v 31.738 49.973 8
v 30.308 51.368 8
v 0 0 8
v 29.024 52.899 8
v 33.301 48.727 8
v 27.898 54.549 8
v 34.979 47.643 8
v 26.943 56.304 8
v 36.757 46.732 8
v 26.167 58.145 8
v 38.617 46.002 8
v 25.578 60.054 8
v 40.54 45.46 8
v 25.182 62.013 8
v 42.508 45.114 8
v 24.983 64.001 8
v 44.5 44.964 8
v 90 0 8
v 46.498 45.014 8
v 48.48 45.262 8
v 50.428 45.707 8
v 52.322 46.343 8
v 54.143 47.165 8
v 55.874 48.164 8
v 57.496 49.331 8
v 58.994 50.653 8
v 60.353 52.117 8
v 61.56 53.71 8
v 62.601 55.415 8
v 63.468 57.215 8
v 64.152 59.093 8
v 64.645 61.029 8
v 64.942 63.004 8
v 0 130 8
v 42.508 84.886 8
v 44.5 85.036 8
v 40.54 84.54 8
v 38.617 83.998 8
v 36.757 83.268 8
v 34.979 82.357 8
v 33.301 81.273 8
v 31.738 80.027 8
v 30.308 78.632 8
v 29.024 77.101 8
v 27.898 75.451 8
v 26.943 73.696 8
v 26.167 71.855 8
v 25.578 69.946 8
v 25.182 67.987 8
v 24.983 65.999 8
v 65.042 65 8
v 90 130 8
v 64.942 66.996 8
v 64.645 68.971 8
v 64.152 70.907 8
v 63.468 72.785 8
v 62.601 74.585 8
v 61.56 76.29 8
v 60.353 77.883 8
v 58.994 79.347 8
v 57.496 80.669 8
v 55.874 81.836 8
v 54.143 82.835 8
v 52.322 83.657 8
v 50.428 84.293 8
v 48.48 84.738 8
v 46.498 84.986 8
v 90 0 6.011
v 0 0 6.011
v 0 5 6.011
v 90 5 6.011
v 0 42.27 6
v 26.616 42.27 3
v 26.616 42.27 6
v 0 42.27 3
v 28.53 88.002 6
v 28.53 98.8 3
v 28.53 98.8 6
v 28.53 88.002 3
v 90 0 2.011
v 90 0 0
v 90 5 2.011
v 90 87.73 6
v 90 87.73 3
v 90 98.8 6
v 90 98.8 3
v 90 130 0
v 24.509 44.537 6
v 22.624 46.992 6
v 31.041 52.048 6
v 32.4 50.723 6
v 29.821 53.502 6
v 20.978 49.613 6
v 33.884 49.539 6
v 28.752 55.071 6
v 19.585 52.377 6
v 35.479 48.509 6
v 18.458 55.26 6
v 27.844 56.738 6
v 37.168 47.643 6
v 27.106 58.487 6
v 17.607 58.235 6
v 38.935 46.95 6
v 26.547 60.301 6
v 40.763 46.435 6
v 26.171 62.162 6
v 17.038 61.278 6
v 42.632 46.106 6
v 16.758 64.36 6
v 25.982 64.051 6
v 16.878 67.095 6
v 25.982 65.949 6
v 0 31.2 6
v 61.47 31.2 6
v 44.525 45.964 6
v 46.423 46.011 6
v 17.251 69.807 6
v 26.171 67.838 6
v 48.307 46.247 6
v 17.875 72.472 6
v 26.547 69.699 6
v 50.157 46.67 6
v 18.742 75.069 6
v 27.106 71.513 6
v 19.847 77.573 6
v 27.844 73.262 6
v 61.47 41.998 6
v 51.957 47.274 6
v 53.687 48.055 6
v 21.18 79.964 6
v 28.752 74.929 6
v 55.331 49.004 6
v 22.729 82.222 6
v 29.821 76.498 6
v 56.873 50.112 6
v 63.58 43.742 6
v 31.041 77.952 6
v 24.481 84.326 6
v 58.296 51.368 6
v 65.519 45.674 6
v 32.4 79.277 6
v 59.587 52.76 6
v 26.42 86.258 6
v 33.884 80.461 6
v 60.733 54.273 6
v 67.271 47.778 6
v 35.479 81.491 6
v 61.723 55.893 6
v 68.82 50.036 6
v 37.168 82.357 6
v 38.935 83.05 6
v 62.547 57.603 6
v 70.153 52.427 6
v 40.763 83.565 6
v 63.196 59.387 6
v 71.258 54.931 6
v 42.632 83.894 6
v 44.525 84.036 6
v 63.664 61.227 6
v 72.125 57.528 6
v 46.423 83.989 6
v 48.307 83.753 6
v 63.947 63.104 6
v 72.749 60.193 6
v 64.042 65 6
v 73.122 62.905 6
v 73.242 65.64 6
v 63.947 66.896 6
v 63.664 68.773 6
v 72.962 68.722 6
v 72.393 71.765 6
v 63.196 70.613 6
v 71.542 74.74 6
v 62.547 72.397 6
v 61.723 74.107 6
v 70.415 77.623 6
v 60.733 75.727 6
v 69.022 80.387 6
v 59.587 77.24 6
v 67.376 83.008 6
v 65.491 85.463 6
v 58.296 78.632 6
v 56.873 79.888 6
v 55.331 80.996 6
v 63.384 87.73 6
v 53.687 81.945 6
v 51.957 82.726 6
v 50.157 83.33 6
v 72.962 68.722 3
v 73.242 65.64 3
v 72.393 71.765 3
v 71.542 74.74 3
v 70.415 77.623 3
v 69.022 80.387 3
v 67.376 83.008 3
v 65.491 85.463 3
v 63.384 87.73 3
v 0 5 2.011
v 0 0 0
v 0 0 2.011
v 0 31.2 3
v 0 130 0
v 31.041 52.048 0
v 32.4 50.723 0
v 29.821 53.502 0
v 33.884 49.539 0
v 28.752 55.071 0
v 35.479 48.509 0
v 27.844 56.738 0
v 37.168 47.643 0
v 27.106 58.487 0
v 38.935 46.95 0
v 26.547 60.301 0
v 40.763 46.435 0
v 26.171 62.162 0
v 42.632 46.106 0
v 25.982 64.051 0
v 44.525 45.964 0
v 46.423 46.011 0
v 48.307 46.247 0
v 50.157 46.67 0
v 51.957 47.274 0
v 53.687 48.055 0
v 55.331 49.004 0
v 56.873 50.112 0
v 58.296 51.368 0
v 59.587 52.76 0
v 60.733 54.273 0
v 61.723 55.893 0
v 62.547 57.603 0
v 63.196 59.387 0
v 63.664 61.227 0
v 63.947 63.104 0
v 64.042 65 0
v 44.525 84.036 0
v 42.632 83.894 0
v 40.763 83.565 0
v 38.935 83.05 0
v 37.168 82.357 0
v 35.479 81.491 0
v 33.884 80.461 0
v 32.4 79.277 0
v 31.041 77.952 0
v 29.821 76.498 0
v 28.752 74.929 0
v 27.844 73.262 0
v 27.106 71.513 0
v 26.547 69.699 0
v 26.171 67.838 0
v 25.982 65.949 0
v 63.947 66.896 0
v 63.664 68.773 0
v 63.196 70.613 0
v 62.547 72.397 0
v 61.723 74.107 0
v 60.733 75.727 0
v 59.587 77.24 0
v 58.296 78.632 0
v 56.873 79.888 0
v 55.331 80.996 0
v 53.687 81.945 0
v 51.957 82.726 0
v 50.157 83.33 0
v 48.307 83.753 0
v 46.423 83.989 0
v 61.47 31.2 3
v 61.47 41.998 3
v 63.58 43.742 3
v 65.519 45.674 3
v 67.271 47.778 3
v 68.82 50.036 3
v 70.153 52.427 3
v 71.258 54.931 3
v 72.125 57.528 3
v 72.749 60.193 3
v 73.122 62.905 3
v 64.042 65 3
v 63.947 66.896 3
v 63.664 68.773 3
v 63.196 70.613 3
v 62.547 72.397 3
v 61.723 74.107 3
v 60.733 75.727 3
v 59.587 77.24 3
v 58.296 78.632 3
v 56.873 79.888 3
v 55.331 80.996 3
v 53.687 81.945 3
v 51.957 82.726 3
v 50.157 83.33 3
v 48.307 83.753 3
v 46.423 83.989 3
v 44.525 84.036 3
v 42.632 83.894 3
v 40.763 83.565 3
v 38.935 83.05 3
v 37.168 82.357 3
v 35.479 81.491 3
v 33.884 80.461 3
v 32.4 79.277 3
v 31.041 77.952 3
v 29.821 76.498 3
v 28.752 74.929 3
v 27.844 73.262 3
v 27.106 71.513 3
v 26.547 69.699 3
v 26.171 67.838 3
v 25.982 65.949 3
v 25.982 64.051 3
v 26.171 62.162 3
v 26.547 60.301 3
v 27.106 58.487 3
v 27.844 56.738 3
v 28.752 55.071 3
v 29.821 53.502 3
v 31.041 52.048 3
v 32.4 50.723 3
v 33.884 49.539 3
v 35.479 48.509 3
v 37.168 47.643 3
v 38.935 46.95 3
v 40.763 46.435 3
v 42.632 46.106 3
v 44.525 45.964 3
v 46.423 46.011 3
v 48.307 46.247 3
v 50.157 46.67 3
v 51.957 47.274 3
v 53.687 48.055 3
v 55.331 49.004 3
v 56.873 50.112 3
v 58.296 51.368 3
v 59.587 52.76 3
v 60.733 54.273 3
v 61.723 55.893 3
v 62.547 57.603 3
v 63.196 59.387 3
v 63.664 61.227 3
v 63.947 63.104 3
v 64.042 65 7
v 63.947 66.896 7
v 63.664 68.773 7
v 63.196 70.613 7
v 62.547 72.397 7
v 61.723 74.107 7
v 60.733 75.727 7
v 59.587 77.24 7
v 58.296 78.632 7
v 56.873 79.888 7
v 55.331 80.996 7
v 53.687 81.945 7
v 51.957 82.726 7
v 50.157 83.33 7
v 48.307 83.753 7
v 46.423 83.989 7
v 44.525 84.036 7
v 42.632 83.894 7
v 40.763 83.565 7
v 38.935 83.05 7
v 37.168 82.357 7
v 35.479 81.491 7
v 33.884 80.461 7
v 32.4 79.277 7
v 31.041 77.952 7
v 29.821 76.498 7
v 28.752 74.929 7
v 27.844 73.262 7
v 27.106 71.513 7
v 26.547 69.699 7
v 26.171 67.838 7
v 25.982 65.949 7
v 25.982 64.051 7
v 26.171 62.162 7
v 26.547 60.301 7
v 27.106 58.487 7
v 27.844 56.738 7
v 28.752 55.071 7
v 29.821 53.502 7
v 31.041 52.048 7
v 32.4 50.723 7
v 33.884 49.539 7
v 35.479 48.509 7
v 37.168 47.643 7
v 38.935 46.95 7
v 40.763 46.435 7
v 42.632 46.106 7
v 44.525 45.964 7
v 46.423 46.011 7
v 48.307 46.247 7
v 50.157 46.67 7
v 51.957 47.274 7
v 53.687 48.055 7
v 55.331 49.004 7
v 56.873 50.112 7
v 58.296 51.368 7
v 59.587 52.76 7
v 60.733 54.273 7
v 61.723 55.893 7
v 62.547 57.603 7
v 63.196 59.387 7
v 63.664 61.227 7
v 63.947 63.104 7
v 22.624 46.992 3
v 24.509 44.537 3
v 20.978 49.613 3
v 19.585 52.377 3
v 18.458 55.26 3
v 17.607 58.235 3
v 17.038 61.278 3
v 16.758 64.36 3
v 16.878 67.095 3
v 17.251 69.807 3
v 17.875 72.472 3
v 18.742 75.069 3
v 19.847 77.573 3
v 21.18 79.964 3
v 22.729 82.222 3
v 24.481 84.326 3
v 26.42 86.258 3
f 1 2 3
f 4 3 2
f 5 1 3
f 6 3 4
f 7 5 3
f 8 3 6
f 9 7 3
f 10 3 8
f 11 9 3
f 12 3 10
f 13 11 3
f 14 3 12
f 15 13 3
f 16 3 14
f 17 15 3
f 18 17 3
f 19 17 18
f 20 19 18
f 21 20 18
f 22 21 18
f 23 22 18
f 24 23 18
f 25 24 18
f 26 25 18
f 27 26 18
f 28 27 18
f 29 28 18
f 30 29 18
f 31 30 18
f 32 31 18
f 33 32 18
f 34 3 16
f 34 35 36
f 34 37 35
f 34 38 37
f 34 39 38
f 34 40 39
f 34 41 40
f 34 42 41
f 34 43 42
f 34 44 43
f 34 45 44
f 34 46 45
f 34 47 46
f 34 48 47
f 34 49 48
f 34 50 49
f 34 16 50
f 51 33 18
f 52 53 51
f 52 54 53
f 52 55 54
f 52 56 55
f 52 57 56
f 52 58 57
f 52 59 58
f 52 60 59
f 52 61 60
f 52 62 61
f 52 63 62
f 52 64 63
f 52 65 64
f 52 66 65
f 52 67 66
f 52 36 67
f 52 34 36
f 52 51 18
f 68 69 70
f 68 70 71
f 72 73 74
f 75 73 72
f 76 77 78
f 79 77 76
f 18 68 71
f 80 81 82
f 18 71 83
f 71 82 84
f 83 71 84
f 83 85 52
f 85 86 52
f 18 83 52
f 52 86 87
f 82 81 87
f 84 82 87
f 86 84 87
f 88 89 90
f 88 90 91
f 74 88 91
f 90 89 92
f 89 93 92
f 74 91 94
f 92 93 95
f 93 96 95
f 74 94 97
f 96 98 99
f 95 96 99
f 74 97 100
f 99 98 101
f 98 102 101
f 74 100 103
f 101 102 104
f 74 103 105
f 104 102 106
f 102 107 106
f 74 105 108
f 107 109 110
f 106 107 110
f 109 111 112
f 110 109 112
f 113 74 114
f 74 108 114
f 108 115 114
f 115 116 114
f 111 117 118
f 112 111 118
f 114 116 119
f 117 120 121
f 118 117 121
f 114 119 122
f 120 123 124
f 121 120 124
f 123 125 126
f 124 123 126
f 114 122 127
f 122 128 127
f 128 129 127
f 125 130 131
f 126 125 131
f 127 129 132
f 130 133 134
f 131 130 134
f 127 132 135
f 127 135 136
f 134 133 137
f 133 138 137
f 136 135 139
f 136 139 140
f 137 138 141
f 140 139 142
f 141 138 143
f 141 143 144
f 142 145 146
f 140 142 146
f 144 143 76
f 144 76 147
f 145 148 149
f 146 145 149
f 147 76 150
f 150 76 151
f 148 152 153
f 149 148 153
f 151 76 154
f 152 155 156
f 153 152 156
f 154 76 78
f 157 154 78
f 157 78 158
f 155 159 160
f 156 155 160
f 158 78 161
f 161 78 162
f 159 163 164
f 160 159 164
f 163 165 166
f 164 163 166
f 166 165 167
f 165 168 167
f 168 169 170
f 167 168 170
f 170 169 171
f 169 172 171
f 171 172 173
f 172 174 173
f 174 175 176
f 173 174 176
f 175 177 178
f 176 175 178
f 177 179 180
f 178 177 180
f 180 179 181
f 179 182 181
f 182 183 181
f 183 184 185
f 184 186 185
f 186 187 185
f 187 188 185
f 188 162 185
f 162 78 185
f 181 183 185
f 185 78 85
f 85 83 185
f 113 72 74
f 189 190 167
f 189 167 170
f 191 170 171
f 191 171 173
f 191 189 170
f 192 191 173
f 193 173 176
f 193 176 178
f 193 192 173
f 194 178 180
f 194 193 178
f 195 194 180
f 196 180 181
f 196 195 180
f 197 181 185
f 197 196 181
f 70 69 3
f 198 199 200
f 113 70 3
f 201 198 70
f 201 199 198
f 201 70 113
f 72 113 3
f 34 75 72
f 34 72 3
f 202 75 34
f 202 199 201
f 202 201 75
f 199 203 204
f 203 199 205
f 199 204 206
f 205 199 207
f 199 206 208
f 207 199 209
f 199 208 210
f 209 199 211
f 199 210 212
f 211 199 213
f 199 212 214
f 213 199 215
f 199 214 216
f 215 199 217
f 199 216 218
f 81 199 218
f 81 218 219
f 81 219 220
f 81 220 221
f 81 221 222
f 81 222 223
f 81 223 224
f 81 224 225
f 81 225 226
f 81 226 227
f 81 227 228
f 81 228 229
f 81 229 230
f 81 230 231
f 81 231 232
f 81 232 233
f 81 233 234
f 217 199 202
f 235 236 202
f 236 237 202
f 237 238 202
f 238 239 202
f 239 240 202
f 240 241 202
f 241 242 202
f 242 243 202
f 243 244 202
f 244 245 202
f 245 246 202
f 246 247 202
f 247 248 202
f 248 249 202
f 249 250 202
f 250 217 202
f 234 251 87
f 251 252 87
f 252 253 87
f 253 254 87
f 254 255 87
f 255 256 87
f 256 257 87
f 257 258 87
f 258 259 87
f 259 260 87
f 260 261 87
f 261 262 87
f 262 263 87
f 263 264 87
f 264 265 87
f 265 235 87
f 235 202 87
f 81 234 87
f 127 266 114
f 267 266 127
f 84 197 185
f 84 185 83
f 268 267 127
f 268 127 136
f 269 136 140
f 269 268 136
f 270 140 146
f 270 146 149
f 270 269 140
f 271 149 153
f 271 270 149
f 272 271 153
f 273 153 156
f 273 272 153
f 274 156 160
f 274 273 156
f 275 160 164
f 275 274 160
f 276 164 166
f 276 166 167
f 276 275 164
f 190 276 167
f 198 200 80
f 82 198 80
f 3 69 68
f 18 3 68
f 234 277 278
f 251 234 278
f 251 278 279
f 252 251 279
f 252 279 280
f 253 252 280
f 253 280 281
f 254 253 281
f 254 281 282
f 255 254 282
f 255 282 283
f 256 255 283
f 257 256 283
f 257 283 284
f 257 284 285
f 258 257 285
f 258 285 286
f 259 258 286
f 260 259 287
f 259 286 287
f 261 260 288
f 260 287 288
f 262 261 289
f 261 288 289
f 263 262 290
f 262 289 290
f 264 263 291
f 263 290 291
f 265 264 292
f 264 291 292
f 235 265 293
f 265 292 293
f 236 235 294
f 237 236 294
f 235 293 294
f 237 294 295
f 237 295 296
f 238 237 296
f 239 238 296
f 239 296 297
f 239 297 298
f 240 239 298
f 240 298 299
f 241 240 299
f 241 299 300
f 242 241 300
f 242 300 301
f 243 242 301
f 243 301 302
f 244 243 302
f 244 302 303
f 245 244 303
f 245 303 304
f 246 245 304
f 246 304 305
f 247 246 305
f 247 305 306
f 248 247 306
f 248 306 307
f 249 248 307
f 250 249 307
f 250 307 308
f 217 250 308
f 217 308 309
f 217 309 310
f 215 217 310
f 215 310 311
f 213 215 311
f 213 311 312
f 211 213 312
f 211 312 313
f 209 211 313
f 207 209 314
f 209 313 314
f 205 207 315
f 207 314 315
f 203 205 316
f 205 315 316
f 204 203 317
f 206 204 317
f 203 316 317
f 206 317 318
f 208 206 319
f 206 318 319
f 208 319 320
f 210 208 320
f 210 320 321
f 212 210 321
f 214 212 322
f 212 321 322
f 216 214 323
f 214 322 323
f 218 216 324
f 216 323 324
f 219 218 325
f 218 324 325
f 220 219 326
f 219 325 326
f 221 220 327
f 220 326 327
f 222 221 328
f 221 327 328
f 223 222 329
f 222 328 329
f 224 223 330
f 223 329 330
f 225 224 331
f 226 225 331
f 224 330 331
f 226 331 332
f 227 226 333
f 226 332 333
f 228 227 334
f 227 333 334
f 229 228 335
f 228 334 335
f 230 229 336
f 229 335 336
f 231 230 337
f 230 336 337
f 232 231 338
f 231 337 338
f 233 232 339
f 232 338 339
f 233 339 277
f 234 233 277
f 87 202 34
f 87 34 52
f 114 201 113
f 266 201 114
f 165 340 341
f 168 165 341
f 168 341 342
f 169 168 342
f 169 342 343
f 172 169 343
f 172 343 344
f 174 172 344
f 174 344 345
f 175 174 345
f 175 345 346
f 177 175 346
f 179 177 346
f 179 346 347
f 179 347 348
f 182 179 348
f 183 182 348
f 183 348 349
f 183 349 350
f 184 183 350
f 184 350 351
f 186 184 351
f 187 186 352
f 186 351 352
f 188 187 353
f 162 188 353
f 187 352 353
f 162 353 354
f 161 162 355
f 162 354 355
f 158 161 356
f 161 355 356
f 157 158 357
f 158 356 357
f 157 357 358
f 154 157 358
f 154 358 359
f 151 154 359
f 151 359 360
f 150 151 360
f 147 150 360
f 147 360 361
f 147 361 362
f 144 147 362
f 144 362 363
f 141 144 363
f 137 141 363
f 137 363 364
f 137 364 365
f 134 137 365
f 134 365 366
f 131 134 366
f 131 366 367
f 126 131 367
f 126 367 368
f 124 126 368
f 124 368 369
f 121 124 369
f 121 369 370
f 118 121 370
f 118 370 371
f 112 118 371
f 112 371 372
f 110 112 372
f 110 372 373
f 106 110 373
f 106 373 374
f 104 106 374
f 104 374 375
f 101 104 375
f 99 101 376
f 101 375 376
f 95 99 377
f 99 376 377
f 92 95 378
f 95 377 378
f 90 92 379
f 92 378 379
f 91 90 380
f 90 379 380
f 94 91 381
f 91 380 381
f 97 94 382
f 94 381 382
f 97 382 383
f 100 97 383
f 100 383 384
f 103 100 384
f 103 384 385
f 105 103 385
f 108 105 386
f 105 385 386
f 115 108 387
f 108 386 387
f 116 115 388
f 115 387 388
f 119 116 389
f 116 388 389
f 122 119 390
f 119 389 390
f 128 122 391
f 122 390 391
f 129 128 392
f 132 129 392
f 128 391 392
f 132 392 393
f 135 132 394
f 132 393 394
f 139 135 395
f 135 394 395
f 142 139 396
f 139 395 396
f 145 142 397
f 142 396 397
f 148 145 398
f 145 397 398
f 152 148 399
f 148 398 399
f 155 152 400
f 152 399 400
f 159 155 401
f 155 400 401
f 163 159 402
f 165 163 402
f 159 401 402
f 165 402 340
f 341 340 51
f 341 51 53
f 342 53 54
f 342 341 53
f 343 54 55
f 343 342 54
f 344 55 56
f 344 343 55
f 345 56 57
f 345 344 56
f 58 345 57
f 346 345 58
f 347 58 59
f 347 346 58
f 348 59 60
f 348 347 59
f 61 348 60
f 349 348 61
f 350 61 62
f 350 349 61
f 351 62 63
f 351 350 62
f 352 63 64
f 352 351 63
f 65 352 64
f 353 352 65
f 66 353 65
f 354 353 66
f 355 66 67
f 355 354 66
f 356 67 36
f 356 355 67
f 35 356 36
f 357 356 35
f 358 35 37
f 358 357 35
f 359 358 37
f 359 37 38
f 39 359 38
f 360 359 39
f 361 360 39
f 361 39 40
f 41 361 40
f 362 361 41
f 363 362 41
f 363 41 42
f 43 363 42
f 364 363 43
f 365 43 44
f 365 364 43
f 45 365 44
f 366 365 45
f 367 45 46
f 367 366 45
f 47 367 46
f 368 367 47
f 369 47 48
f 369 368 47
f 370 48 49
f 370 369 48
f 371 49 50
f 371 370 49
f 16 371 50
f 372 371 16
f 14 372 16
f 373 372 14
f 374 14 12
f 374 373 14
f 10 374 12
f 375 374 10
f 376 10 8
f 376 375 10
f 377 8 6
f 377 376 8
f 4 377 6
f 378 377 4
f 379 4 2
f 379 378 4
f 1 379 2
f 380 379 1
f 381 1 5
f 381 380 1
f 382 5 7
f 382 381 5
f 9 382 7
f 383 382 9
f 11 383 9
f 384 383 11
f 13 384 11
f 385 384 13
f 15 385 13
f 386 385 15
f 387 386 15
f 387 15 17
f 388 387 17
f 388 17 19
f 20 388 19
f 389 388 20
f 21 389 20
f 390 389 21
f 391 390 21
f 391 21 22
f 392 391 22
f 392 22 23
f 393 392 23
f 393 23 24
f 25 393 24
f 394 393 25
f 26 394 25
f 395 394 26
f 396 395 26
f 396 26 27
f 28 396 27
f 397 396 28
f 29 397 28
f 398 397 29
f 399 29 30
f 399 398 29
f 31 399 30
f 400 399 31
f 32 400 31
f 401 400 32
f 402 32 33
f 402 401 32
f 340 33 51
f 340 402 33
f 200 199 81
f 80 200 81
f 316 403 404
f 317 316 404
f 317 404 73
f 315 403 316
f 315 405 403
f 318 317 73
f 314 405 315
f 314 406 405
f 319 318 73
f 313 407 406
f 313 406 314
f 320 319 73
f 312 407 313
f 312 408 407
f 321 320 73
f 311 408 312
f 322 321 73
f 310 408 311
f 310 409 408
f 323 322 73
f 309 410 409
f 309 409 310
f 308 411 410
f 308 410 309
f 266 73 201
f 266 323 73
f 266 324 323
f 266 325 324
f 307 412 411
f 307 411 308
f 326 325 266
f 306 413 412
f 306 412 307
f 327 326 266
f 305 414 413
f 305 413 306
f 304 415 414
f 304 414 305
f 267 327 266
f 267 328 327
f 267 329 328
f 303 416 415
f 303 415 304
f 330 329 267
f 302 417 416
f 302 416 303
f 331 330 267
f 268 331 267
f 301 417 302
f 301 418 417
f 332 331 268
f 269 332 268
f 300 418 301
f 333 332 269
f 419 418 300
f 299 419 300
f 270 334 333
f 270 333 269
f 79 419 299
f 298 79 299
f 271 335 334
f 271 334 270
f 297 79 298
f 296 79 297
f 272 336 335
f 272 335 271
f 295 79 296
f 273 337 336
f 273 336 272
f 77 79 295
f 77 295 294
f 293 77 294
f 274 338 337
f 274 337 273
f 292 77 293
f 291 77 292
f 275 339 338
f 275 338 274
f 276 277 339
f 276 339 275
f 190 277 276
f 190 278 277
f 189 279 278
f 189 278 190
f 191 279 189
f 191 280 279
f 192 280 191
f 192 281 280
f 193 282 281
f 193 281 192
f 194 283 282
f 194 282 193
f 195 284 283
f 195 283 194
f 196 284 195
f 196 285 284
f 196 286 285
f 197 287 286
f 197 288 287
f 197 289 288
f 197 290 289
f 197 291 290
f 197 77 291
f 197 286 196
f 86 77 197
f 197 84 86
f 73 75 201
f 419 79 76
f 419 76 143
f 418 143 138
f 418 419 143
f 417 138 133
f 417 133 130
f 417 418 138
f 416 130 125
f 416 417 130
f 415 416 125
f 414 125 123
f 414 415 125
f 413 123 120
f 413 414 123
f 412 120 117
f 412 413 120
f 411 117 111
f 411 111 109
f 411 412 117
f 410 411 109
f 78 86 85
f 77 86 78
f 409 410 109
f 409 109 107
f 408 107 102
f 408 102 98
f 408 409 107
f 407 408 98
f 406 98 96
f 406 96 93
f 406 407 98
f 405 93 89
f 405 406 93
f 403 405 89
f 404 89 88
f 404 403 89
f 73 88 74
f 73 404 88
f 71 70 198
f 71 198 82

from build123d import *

# Parameters (mm, degrees)
SKETCH_W        = 90
SKETCH_H        = 130
PAD_DEPTH       = 3
PAD007_DEPTH    = 3
PAD006_DEPTH    = 3
SKETCH009_W     = 90
SKETCH009_H     = 130
PAD008_DEPTH    = 2
SKETCH010_R     = 19.0420352847
POCKET_DEPTH    = 10
CHAMFER_SIZE    = 1
SKETCH011_W     = 90
SKETCH011_H     = 4
POCKET001_DEPTH = 5


with BuildPart() as pad007:
    # Sketch → Pad (new body)
    with BuildSketch(Plane.XY):
        with Locations((45, 65)):
            Rectangle(SKETCH_W, SKETCH_H)
    extrude(amount=PAD_DEPTH)

    # Sketch006 → Pad007 (new body)
    with BuildSketch(Plane.XY.offset(3)):
        with BuildLine():
            Line((0, 0), (90, 0))
            Line((90, 0), (90, 31.200001))
            Line((90, 87.7297593266), (90, 31.200001))
            Line((63.384261619, 87.7297593266), (90, 87.7297593266))
            ThreePointArc((73.2419105019, 65.6401585516), (70.414665309, 77.6228043326), (63.384261619, 87.7297593266))
            ThreePointArc((61.470024, 41.9983394519), (70.1525128312, 52.4267750542), (73.2419105019, 65.6401585516))
            Line((61.470024, 31.2), (61.470024, 41.9983394519))
            Line((0, 31.2), (61.470024, 31.2))
            Line((0, 31.2), (0, 0))
        make_face()
    extrude(amount=PAD007_DEPTH)


with BuildPart() as pocket001:
    # Sketch008 → Pad006 (new body)
    with BuildSketch(Plane(origin=(90, 130, 3), x_dir=(-1, 0, 0), z_dir=(0, 0, 1))):
        with BuildLine():
            Line((0, 0), (90, 0))
            Line((90, 0), (90, 31.200001))
            Line((90, 87.7297593266), (90, 31.200001))
            Line((63.384261619, 87.7297593266), (90, 87.7297593266))
            ThreePointArc((73.2419105019, 65.6401585516), (70.414665309, 77.6228043326), (63.384261619, 87.7297593266))
            ThreePointArc((61.470024, 41.9983394519), (70.1525128312, 52.4267750542), (73.2419105019, 65.6401585516))
            Line((61.470024, 31.2), (61.470024, 41.9983394519))
            Line((0, 31.2), (61.470024, 31.2))
            Line((0, 31.2), (0, 0))
        make_face()
    extrude(amount=PAD006_DEPTH)

    # Fusion: union Pad007
    add(pad007.part)

    # Sketch009 → Pad008 (new body)
    with BuildSketch(Plane.XY.offset(6)):
        with Locations((45, 65)):
            Rectangle(SKETCH009_W, SKETCH009_H)
    extrude(amount=PAD008_DEPTH)

    # Sketch010 → Pocket (cut)
    with BuildSketch(Plane.XY.offset(8)):
        with Locations((45, 65)):
            Circle(SKETCH010_R)
    extrude(amount=-POCKET_DEPTH, mode=Mode.SUBTRACT)

    # Chamfer
    chamfer_edges = [pocket001.edges().sort_by_distance(p)[0] for p in [
        (25.957965, 65, 8),
    ]]
    chamfer(chamfer_edges, length=CHAMFER_SIZE)

    # Sketch011 → Pocket001 (cut)
    with BuildSketch(Plane.XZ):
        with Locations((45, 4.0113657125)):
            Rectangle(SKETCH011_W, SKETCH011_H)
    extrude(amount=-POCKET001_DEPTH, mode=Mode.SUBTRACT)


solid = pocket001.part
